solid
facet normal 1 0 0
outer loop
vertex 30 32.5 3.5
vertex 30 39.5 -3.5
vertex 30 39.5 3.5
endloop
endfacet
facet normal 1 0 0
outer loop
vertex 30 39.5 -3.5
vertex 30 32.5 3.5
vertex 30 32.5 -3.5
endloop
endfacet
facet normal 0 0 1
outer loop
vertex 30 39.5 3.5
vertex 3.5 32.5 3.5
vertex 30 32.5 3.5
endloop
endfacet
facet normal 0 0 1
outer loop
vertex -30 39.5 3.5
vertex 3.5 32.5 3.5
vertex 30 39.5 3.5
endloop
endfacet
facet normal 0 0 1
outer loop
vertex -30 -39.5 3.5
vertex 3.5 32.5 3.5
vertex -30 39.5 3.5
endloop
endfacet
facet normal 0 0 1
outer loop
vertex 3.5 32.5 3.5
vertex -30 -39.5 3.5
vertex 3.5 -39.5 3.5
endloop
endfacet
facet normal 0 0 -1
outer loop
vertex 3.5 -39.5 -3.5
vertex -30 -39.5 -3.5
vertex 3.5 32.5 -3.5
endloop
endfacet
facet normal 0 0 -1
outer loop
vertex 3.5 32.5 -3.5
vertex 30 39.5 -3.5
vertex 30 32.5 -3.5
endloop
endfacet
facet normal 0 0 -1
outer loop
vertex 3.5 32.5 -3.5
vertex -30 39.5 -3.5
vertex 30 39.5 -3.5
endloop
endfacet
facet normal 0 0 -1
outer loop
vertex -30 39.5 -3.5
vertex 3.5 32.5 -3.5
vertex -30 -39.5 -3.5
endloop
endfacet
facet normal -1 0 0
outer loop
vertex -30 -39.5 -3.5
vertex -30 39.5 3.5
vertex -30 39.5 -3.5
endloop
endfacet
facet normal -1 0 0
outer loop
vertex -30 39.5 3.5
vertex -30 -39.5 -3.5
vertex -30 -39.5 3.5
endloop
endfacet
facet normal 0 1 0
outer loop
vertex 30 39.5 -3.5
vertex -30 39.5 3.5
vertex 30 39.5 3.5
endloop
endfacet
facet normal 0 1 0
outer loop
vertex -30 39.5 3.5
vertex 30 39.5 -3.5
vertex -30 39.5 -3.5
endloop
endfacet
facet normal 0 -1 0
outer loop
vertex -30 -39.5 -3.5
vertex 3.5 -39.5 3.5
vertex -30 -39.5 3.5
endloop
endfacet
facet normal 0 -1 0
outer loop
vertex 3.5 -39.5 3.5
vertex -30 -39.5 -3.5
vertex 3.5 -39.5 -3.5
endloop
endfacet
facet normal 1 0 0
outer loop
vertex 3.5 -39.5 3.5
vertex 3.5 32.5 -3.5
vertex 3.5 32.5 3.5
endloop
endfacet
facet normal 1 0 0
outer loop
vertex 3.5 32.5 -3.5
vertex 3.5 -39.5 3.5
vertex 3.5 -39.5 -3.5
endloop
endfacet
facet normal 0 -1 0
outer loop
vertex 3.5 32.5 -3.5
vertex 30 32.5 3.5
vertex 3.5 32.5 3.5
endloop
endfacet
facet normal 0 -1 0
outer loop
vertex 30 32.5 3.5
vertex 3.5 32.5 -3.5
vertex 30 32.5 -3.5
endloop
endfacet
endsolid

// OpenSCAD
// for the big one, found in 03/2023

$fn=50;

w_batt = 61;
h_batt = 80;
t_batt = 39;

// Make it a multiple of nozzle size
t_wall = 1.2;

// thickness of the PCB holder
pcb_t = 7;

// PCB position
h_pcb = 72.5;
w_pcb = 27;
pcb_x = w_batt / 2 - w_pcb / 2;
pcb_y = -h_batt / 2 + h_pcb / 2;
pcb_z = pcb_t / 2 + t_batt / 2 + 0.01;

// thickness of the top and bottom denim-lined plates
h_plates = 1;
t_denim = 1;
plate_z = t_batt / 2 + h_plates / 2 + pcb_t + t_denim;

module corners(w=10, h=5) {
    for (i = [-1, 1])
        for (j = [-1, 1])
            translate([w / 2 * i, h / 2 * j, 0]) children(0);
}


module batt() {
    // color("green") {
    //     translate([12.0, 4, t_batt / 2 + 3])
    //         cube(size=[32.5, 65, 6], center=true);
    // }
    color("grey")
        cube(size=[w_batt, h_batt, t_batt], center=true);
}


module box() {
    h_box = t_batt + pcb_t + 2 * h_plates + 4 * t_denim;
    translate([0, 0, pcb_t / 2])
        difference() {
            // outer dimensions of box
            cube(size=[w_batt + 2 * t_wall, h_batt + 2 * t_wall, h_box], center=true);
            // inner dimensions of box
            cube(size=[w_batt, h_batt, h_box + 1], center=true);
            // bottom notch for lid
            // translate([0, 0, (t_wall - h_box - 0.01) / 2])
            //     cube(size=[w_batt + t_wall, h_batt + t_wall, t_wall], center=true);
            // USB holes
            translate([pcb_x, pcb_y, pcb_z - pcb_t / 2])
                usb_holes();
        }
}


module usb_holes() {
    translate([33 / 2, 72 / 2 - 20, 0]) {
        // cut 2 big USB holes
        for (i = [-1, 1])
            translate([0, i * 10, 0])
                cube(size=[10, 14, 7], center=true);

        // cut USB-C hole
        translate([0, -27.5, -1.25])
            cube(size=[10, 11, 4], center=true);

        // apple hole
        translate([0, -43, 0])
            cube(size=[10, 10, 7], center=true);

        // button hole
        translate([-17, -53, 0])
            rotate([90, 0, 0])
                cylinder(h=10, d=5, center=true);

        // LED holes
        translate([-16, -53 + 9, 10])
            cube(size=[15, 3, 20], center=true);
    }
}


module pcb_holder() {
    difference() {
        cube(size=[w_batt - 1, h_batt - 1, pcb_t], center=true);

        // cavity for PCB
        translate([pcb_x, pcb_y, 0])
            cube(size=[w_pcb, h_pcb, 10], center=true);
    }
}

module denim_plate() {
    difference() {
        cube(size=[w_batt - 2 * t_denim, h_batt - 2 * t_denim, h_plates], center=true);
        translate([pcb_x, pcb_y, -10])
            usb_holes();
    }
}


intersection() {
    union() {
        batt();
        box();

        // color("orange")
        //     for (z = [plate_z, -plate_z + pcb_t])
        //         translate([0, 0, z])
        //             denim_plate();

        color("blue")
            translate([0, 0, pcb_z])
                !pcb_holder();
    }
    // translate([0, 100, 0])
    //     cube([200, 200, 200], center=true);
}
